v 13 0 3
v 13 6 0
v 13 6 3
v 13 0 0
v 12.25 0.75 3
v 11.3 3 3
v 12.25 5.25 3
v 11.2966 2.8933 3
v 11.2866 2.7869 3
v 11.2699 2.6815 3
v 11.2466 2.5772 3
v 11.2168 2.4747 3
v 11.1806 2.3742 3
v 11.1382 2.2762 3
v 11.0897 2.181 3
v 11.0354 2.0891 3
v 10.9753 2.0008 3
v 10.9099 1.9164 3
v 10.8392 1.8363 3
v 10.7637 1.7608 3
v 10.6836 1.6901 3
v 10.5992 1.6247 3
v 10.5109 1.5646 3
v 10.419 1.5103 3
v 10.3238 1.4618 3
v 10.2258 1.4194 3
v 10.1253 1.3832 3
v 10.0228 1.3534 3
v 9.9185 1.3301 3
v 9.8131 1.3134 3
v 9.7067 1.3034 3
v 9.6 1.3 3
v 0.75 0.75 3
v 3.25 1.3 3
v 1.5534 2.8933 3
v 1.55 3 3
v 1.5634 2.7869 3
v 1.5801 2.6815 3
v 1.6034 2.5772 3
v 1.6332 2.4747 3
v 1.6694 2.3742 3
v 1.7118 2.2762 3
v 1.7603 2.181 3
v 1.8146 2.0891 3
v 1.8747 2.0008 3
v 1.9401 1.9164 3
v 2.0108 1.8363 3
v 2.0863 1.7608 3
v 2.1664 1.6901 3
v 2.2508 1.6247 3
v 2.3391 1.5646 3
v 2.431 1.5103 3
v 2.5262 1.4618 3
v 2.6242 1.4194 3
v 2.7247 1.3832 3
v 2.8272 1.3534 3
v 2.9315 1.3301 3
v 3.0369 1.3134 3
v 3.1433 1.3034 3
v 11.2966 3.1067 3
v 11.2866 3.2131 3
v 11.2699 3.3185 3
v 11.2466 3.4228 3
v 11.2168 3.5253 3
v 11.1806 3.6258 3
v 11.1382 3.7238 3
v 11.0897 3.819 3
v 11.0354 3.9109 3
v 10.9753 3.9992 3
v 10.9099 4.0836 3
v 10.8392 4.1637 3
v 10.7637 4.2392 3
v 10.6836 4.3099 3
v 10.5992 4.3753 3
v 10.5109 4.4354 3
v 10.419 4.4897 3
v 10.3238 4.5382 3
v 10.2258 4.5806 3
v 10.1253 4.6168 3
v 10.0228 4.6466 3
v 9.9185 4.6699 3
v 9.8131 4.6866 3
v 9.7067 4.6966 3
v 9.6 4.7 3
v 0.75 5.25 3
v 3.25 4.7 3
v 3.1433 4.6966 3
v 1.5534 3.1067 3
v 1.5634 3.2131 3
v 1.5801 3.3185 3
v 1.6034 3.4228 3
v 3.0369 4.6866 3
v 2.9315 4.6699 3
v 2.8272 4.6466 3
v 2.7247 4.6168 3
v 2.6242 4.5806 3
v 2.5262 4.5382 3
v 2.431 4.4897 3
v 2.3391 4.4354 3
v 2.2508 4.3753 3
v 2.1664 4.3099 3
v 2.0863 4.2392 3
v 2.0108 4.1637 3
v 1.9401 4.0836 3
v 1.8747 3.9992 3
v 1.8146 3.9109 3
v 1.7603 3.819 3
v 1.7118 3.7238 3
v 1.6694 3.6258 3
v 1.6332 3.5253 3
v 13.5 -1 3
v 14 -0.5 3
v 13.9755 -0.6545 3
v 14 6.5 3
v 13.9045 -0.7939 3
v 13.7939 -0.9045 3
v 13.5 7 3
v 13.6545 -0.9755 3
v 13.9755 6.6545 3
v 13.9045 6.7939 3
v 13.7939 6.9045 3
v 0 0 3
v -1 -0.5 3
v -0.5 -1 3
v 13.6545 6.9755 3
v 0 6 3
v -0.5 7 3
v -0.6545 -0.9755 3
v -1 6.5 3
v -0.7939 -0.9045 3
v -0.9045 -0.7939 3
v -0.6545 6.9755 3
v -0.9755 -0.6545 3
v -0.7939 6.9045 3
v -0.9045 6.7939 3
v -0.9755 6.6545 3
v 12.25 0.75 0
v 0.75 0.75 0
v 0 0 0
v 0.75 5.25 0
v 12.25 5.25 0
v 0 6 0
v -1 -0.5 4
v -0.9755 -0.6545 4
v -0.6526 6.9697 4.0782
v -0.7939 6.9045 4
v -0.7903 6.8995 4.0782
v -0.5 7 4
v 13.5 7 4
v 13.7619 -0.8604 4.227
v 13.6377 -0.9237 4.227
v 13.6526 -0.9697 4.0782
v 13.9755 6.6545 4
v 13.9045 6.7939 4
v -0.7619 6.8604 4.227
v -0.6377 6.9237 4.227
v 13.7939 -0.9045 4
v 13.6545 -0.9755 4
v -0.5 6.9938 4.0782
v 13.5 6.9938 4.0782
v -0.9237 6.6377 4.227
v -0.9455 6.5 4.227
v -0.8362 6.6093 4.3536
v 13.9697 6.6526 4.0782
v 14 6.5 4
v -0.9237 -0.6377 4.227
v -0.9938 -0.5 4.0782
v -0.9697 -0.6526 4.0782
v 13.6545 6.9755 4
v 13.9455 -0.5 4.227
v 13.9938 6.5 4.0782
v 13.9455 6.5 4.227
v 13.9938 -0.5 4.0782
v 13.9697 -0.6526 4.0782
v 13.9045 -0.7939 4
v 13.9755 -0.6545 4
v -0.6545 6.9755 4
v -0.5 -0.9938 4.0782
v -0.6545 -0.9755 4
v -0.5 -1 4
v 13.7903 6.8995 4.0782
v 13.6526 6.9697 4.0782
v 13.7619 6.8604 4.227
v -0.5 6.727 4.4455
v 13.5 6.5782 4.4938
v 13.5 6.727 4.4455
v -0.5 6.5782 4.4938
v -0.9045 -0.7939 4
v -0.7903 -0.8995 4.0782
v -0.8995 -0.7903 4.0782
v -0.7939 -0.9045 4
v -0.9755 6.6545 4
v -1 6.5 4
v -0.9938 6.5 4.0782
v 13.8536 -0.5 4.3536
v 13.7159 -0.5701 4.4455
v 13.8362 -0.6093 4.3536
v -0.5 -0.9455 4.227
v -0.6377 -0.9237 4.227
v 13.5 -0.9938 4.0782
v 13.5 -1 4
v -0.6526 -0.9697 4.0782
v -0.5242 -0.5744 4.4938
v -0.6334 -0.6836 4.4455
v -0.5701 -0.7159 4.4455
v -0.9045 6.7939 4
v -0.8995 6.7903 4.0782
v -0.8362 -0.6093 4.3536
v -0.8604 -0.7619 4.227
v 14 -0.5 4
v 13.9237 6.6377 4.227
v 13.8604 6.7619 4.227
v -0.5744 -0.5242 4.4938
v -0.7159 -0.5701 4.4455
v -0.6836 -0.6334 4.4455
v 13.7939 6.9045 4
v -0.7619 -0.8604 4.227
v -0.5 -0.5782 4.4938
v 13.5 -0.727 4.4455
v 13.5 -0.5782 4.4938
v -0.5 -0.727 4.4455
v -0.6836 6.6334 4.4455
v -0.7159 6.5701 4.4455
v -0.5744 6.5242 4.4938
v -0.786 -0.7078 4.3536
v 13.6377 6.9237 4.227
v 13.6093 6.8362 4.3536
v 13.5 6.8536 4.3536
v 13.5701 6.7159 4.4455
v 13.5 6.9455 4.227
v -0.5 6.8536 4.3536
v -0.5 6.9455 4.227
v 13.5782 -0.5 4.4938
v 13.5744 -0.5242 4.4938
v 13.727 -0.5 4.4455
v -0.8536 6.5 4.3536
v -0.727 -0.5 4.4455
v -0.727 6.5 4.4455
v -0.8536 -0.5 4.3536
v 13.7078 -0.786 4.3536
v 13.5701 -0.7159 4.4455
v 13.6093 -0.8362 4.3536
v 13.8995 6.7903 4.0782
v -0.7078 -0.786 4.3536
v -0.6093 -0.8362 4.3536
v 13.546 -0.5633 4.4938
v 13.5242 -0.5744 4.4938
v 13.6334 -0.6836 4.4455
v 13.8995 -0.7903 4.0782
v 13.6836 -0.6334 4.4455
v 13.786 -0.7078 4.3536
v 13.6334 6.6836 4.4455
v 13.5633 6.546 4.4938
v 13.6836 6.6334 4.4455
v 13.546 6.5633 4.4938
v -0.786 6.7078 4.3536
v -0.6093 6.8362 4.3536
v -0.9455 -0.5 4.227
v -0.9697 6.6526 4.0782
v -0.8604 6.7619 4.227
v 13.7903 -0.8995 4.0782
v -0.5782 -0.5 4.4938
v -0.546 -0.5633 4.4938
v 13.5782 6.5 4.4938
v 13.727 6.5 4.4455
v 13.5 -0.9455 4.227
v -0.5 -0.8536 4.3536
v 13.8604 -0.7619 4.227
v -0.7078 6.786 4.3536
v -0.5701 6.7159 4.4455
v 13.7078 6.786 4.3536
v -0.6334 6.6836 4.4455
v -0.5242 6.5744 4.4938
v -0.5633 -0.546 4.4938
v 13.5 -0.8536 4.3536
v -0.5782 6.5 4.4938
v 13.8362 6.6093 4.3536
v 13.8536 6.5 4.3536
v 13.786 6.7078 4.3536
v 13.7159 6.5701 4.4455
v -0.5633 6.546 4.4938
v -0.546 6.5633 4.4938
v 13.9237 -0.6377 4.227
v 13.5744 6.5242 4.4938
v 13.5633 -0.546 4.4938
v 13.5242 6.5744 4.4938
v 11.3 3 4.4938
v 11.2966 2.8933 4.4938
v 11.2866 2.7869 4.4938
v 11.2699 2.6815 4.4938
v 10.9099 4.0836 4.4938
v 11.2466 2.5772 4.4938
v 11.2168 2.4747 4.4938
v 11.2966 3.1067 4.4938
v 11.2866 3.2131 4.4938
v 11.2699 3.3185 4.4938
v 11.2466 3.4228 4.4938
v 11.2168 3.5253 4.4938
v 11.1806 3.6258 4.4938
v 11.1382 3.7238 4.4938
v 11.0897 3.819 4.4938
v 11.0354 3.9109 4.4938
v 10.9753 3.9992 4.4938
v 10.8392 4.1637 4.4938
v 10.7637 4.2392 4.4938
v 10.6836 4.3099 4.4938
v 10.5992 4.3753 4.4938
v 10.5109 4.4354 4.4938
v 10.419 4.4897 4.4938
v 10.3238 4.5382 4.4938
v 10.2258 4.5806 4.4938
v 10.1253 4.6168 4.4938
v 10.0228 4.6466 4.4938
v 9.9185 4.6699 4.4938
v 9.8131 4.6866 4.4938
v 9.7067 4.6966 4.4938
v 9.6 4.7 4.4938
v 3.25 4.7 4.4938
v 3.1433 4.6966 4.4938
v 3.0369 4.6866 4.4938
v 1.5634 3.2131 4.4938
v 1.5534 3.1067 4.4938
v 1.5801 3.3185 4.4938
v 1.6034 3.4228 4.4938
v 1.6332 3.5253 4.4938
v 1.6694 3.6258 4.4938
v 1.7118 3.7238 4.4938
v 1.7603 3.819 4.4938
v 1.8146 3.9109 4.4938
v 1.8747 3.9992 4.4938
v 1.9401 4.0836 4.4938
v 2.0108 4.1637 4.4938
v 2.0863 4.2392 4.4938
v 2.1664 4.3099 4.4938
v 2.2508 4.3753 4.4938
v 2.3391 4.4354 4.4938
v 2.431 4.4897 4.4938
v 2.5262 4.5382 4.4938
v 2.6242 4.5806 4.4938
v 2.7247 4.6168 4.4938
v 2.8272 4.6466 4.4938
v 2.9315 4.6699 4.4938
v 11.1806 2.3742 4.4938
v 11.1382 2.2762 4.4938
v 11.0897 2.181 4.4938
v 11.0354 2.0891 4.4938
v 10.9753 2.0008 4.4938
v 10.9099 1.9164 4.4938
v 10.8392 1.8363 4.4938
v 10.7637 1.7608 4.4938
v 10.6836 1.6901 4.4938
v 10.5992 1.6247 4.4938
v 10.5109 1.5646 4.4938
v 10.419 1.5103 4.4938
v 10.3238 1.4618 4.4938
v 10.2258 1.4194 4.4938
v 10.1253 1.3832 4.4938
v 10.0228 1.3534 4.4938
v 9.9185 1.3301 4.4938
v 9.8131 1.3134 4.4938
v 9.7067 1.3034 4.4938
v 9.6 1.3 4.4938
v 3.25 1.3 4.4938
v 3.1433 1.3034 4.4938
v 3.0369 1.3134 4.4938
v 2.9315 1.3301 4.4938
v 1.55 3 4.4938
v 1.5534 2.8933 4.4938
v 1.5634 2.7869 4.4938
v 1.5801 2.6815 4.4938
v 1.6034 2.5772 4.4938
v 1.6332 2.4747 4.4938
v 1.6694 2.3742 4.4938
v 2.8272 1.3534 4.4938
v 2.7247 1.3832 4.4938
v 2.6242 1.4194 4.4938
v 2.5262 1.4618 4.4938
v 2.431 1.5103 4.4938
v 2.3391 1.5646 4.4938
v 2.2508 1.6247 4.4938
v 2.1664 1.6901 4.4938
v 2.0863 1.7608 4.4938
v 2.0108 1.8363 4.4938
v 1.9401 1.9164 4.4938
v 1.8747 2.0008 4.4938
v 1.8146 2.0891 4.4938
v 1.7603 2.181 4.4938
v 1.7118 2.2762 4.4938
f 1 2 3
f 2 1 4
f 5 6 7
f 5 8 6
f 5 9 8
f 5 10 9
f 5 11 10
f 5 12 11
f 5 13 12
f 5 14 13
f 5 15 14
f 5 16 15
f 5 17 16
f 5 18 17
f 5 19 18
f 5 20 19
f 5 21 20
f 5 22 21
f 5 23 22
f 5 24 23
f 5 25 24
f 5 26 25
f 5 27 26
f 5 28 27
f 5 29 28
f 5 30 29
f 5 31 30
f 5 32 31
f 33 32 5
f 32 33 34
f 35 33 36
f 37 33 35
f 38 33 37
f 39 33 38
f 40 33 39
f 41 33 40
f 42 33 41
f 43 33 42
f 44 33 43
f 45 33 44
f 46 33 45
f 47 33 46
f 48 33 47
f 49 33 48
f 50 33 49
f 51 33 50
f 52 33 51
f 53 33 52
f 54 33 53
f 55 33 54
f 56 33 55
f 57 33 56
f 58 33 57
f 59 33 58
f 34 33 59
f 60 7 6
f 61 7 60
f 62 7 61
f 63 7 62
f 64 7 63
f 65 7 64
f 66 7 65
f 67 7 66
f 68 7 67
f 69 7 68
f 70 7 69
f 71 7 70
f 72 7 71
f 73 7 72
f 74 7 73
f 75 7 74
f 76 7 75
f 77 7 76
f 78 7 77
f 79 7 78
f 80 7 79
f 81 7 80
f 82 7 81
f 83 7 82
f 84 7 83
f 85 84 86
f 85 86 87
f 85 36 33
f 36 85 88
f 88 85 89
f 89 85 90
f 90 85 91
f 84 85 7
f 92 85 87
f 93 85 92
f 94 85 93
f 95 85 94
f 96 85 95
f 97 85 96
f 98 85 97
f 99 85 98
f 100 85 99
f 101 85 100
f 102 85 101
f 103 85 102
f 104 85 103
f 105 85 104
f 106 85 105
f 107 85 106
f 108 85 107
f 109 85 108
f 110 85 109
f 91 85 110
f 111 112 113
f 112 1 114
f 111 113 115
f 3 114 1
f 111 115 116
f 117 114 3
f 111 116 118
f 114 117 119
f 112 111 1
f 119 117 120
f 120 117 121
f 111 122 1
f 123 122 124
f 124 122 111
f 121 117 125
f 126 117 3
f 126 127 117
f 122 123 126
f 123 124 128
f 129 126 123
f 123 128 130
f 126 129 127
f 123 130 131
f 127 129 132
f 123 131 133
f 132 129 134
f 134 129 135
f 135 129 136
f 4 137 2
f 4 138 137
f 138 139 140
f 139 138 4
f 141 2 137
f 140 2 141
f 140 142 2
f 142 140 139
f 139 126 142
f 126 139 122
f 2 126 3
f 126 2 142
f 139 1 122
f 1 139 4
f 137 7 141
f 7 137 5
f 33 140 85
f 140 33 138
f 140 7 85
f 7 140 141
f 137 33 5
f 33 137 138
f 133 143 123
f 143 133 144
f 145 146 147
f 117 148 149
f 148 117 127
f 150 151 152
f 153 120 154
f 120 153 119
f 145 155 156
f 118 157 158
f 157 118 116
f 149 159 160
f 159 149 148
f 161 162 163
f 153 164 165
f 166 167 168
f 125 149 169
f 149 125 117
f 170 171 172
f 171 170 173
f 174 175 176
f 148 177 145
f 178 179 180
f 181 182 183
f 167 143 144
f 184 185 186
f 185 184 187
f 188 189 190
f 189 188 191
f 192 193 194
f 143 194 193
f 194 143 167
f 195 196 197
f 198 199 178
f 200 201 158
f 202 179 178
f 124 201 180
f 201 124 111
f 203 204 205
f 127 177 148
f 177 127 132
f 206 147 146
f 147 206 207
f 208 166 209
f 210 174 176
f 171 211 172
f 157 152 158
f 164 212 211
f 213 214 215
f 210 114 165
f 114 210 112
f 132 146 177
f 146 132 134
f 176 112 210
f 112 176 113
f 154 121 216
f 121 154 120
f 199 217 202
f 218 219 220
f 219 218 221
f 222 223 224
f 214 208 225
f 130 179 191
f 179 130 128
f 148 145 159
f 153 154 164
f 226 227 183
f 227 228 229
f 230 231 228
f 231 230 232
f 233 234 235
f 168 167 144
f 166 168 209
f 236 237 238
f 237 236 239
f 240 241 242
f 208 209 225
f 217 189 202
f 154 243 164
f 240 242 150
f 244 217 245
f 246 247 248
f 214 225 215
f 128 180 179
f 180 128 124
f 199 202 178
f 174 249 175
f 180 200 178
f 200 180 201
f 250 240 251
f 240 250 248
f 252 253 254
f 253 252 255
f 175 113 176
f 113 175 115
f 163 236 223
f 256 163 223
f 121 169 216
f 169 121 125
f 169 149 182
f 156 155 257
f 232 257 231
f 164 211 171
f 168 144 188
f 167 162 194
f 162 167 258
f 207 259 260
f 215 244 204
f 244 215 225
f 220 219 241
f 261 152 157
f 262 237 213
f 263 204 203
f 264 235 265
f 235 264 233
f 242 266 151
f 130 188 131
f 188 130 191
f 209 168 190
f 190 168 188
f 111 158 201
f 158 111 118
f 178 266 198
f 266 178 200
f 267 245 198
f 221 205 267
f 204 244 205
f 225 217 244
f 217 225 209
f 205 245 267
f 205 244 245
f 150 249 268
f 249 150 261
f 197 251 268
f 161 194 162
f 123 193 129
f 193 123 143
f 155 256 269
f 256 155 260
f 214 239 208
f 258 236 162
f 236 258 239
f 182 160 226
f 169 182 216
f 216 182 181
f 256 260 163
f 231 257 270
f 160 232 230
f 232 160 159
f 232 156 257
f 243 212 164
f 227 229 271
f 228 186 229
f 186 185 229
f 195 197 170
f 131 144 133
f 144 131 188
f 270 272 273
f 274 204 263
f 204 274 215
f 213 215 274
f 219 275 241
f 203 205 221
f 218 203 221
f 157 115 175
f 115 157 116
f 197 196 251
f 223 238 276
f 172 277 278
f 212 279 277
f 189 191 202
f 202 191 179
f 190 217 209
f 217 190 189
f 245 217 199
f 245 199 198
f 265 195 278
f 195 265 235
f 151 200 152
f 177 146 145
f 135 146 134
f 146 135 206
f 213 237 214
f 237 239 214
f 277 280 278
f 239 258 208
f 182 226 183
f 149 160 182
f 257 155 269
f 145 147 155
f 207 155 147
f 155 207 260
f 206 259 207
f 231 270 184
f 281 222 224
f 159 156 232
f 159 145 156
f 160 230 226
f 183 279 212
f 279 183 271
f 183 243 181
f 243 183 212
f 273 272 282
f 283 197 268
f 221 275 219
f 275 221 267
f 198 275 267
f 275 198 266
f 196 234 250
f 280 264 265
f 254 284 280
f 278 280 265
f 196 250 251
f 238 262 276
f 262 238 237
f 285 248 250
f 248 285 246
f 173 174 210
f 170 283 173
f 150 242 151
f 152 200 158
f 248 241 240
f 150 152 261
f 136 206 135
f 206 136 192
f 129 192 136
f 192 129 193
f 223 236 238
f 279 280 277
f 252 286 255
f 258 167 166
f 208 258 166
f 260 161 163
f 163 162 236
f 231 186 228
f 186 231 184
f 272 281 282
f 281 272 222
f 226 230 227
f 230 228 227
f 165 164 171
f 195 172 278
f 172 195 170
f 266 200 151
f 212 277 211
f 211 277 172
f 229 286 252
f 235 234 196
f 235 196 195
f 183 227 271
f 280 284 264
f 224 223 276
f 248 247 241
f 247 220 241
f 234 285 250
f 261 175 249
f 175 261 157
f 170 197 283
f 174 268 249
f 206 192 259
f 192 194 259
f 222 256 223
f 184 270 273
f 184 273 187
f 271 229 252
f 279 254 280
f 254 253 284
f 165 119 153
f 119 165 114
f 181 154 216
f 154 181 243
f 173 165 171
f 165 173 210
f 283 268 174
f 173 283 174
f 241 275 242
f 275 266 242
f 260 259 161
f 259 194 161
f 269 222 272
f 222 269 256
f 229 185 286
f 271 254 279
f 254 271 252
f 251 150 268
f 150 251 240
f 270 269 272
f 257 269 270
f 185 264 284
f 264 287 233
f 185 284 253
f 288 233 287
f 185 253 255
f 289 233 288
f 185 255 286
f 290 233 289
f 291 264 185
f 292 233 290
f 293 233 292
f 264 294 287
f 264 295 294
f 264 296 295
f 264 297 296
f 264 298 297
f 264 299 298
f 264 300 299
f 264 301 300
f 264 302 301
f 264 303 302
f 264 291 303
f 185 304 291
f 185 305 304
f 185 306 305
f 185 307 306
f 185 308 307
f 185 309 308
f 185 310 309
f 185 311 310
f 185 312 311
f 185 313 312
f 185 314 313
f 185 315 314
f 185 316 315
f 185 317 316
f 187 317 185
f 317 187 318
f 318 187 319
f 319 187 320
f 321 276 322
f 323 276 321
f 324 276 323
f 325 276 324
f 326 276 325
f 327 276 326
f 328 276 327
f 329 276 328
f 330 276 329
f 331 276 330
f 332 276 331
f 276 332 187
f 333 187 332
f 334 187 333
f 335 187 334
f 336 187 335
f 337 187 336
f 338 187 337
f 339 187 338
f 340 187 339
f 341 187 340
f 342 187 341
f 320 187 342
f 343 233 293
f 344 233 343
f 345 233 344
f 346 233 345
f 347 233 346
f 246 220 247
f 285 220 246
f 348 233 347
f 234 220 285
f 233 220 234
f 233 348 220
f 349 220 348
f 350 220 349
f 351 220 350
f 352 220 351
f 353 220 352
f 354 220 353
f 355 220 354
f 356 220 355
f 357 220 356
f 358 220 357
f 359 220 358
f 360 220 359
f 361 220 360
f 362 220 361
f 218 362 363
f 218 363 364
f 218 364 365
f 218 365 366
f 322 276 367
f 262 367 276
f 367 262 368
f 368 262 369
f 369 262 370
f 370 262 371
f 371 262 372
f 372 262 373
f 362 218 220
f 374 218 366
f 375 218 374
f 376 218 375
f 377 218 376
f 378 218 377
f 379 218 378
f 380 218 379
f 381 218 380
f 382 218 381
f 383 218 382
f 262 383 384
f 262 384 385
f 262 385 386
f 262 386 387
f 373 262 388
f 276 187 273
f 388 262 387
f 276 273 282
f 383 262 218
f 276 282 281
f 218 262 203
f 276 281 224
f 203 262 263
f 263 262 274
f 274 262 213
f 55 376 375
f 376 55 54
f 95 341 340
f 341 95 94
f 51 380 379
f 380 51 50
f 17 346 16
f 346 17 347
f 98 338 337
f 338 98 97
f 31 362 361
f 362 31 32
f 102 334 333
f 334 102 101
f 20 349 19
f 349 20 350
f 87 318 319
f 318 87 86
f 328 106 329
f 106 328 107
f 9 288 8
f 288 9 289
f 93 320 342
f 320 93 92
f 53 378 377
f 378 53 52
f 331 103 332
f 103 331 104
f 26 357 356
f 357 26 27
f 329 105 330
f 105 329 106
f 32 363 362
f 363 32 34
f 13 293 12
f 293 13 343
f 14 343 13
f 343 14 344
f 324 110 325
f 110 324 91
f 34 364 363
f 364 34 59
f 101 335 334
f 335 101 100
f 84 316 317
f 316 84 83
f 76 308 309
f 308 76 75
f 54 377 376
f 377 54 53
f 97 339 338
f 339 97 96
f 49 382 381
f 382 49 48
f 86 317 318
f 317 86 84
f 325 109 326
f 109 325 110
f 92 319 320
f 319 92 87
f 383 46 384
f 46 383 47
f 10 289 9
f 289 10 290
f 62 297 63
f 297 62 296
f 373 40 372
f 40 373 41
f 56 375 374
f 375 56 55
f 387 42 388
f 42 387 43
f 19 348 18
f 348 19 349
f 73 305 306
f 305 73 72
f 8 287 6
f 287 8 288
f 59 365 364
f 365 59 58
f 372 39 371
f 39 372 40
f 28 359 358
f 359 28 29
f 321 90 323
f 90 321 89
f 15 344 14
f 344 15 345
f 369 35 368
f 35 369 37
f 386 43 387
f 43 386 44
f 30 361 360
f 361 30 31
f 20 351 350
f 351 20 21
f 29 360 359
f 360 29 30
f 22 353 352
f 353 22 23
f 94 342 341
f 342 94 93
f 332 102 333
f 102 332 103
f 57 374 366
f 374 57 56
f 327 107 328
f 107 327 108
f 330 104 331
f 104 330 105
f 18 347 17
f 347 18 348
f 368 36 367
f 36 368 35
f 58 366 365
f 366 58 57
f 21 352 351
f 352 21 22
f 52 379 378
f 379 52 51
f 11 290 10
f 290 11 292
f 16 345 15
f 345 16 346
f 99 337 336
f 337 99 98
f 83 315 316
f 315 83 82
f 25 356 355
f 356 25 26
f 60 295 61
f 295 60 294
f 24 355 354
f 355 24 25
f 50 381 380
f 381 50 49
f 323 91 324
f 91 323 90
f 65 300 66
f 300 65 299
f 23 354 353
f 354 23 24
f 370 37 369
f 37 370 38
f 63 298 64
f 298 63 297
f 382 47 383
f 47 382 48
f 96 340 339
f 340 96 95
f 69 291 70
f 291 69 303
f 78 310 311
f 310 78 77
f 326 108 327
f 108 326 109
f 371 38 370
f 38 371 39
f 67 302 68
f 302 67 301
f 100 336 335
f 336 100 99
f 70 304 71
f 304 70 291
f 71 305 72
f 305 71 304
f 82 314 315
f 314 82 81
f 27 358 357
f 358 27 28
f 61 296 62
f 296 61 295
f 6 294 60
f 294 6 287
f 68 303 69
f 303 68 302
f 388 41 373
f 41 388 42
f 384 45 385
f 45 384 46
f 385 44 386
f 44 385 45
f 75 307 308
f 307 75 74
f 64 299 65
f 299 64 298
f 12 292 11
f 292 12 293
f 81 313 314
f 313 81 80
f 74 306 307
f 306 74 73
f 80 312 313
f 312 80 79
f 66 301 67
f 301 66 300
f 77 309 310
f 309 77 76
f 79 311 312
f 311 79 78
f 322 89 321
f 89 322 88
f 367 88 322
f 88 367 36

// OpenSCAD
_plugWallThickness = 0.75;
_plugLength = 13;
_plugWidth = 6;
_plugDepth = 3;

_plugCutoutLength = _plugLength - _plugWallThickness*2;
_plugCutoutWidth = _plugWidth - _plugWallThickness*2;
_plugCutoutDepth = _plugDepth + 2;

_capBrimThickness = 1;
_capLength = _plugLength + _capBrimThickness*2;
_capWidth = _plugWidth + _capBrimThickness*2;
_capDepth = 1.5;

_usbcPlugDiameter = 3.4;
_usbcPlugLength = 9.75;

///MAIN START///

cap();

///MAIN END///

module cap()
{
    difference()
    {
        union()
        {
            difference()
            {
                cube([_plugLength, _plugWidth, _plugDepth]);
                translate([_plugWallThickness, _plugWallThickness, -1])
                cube([_plugCutoutLength, _plugCutoutWidth, _plugCutoutDepth]);
            }
            translate([-_capBrimThickness, -_capBrimThickness, _plugDepth])
            roundedCube(size=[_capLength,_capWidth,_capDepth], apply_to="zmax");
        }

        translate([(_plugLength-_usbcPlugLength), _plugWidth/2, _plugDepth-1])
        usbcPunch(_capDepth+2);
    }
}

//Punches
module usbcPunch(depth)
{
    hull()
    {
        cylinder(d=_usbcPlugDiameter, h=depth, $fn=100);
        translate([_usbcPlugLength-_usbcPlugDiameter, 0, 0])
        cylinder(d=_usbcPlugDiameter, h=depth, $fn=100);
    }
}

//Utility
/// Builds a cube with rounded corners
/// size - dimension vector
/// center - centered on xyz planes?
/// radius - rounding radius
/// apply_to - which sides to round
module roundedCube(size = [1, 1, 1], center = false, radius = 0.5, apply_to = "all")
{
    // If single value, convert to [x, y, z] vector
    size = (size[0] == undef) ? [size, size, size] : size;

    translate_min = radius;
    translate_xmax = size[0] - radius;
    translate_ymax = size[1] - radius;
    translate_zmax = size[2] - radius;

    diameter = radius * 2;

    obj_translate = (center == false) ?
        [0, 0, 0] : [
            -(size[0] / 2),
            -(size[1] / 2),
            -(size[2] / 2)
        ];

    translate(v = obj_translate) {
        hull() {
            for (translate_x = [translate_min, translate_xmax]) {
                x_at = (translate_x == translate_min) ? "min" : "max";
                for (translate_y = [translate_min, translate_ymax]) {
                    y_at = (translate_y == translate_min) ? "min" : "max";
                    for (translate_z = [translate_min, translate_zmax]) {
                        z_at = (translate_z == translate_min) ? "min" : "max";

                        translate(v = [translate_x, translate_y, translate_z])
                        if (
                            (apply_to == "all") ||
                            (apply_to == "xmin" && x_at == "min") || (apply_to == "xmax" && x_at == "max") ||
                            (apply_to == "ymin" && y_at == "min") || (apply_to == "ymax" && y_at == "max") ||
                            (apply_to == "zmin" && z_at == "min") || (apply_to == "zmax" && z_at == "max")
                        ) {
                            sphere(r = radius, $fn=20);
                        } else {
                            rotate =
                                (apply_to == "xmin" || apply_to == "xmax" || apply_to == "x") ? [0, 90, 0] : (
                                (apply_to == "ymin" || apply_to == "ymax" || apply_to == "y") ? [90, 90, 0] :
                                [0, 0, 0]
                            );
                            rotate(a = rotate)
                            cylinder(h = diameter, r = radius, center = true, $fn=20);
                        }
                    }
                }
            }
        }
    }
}
